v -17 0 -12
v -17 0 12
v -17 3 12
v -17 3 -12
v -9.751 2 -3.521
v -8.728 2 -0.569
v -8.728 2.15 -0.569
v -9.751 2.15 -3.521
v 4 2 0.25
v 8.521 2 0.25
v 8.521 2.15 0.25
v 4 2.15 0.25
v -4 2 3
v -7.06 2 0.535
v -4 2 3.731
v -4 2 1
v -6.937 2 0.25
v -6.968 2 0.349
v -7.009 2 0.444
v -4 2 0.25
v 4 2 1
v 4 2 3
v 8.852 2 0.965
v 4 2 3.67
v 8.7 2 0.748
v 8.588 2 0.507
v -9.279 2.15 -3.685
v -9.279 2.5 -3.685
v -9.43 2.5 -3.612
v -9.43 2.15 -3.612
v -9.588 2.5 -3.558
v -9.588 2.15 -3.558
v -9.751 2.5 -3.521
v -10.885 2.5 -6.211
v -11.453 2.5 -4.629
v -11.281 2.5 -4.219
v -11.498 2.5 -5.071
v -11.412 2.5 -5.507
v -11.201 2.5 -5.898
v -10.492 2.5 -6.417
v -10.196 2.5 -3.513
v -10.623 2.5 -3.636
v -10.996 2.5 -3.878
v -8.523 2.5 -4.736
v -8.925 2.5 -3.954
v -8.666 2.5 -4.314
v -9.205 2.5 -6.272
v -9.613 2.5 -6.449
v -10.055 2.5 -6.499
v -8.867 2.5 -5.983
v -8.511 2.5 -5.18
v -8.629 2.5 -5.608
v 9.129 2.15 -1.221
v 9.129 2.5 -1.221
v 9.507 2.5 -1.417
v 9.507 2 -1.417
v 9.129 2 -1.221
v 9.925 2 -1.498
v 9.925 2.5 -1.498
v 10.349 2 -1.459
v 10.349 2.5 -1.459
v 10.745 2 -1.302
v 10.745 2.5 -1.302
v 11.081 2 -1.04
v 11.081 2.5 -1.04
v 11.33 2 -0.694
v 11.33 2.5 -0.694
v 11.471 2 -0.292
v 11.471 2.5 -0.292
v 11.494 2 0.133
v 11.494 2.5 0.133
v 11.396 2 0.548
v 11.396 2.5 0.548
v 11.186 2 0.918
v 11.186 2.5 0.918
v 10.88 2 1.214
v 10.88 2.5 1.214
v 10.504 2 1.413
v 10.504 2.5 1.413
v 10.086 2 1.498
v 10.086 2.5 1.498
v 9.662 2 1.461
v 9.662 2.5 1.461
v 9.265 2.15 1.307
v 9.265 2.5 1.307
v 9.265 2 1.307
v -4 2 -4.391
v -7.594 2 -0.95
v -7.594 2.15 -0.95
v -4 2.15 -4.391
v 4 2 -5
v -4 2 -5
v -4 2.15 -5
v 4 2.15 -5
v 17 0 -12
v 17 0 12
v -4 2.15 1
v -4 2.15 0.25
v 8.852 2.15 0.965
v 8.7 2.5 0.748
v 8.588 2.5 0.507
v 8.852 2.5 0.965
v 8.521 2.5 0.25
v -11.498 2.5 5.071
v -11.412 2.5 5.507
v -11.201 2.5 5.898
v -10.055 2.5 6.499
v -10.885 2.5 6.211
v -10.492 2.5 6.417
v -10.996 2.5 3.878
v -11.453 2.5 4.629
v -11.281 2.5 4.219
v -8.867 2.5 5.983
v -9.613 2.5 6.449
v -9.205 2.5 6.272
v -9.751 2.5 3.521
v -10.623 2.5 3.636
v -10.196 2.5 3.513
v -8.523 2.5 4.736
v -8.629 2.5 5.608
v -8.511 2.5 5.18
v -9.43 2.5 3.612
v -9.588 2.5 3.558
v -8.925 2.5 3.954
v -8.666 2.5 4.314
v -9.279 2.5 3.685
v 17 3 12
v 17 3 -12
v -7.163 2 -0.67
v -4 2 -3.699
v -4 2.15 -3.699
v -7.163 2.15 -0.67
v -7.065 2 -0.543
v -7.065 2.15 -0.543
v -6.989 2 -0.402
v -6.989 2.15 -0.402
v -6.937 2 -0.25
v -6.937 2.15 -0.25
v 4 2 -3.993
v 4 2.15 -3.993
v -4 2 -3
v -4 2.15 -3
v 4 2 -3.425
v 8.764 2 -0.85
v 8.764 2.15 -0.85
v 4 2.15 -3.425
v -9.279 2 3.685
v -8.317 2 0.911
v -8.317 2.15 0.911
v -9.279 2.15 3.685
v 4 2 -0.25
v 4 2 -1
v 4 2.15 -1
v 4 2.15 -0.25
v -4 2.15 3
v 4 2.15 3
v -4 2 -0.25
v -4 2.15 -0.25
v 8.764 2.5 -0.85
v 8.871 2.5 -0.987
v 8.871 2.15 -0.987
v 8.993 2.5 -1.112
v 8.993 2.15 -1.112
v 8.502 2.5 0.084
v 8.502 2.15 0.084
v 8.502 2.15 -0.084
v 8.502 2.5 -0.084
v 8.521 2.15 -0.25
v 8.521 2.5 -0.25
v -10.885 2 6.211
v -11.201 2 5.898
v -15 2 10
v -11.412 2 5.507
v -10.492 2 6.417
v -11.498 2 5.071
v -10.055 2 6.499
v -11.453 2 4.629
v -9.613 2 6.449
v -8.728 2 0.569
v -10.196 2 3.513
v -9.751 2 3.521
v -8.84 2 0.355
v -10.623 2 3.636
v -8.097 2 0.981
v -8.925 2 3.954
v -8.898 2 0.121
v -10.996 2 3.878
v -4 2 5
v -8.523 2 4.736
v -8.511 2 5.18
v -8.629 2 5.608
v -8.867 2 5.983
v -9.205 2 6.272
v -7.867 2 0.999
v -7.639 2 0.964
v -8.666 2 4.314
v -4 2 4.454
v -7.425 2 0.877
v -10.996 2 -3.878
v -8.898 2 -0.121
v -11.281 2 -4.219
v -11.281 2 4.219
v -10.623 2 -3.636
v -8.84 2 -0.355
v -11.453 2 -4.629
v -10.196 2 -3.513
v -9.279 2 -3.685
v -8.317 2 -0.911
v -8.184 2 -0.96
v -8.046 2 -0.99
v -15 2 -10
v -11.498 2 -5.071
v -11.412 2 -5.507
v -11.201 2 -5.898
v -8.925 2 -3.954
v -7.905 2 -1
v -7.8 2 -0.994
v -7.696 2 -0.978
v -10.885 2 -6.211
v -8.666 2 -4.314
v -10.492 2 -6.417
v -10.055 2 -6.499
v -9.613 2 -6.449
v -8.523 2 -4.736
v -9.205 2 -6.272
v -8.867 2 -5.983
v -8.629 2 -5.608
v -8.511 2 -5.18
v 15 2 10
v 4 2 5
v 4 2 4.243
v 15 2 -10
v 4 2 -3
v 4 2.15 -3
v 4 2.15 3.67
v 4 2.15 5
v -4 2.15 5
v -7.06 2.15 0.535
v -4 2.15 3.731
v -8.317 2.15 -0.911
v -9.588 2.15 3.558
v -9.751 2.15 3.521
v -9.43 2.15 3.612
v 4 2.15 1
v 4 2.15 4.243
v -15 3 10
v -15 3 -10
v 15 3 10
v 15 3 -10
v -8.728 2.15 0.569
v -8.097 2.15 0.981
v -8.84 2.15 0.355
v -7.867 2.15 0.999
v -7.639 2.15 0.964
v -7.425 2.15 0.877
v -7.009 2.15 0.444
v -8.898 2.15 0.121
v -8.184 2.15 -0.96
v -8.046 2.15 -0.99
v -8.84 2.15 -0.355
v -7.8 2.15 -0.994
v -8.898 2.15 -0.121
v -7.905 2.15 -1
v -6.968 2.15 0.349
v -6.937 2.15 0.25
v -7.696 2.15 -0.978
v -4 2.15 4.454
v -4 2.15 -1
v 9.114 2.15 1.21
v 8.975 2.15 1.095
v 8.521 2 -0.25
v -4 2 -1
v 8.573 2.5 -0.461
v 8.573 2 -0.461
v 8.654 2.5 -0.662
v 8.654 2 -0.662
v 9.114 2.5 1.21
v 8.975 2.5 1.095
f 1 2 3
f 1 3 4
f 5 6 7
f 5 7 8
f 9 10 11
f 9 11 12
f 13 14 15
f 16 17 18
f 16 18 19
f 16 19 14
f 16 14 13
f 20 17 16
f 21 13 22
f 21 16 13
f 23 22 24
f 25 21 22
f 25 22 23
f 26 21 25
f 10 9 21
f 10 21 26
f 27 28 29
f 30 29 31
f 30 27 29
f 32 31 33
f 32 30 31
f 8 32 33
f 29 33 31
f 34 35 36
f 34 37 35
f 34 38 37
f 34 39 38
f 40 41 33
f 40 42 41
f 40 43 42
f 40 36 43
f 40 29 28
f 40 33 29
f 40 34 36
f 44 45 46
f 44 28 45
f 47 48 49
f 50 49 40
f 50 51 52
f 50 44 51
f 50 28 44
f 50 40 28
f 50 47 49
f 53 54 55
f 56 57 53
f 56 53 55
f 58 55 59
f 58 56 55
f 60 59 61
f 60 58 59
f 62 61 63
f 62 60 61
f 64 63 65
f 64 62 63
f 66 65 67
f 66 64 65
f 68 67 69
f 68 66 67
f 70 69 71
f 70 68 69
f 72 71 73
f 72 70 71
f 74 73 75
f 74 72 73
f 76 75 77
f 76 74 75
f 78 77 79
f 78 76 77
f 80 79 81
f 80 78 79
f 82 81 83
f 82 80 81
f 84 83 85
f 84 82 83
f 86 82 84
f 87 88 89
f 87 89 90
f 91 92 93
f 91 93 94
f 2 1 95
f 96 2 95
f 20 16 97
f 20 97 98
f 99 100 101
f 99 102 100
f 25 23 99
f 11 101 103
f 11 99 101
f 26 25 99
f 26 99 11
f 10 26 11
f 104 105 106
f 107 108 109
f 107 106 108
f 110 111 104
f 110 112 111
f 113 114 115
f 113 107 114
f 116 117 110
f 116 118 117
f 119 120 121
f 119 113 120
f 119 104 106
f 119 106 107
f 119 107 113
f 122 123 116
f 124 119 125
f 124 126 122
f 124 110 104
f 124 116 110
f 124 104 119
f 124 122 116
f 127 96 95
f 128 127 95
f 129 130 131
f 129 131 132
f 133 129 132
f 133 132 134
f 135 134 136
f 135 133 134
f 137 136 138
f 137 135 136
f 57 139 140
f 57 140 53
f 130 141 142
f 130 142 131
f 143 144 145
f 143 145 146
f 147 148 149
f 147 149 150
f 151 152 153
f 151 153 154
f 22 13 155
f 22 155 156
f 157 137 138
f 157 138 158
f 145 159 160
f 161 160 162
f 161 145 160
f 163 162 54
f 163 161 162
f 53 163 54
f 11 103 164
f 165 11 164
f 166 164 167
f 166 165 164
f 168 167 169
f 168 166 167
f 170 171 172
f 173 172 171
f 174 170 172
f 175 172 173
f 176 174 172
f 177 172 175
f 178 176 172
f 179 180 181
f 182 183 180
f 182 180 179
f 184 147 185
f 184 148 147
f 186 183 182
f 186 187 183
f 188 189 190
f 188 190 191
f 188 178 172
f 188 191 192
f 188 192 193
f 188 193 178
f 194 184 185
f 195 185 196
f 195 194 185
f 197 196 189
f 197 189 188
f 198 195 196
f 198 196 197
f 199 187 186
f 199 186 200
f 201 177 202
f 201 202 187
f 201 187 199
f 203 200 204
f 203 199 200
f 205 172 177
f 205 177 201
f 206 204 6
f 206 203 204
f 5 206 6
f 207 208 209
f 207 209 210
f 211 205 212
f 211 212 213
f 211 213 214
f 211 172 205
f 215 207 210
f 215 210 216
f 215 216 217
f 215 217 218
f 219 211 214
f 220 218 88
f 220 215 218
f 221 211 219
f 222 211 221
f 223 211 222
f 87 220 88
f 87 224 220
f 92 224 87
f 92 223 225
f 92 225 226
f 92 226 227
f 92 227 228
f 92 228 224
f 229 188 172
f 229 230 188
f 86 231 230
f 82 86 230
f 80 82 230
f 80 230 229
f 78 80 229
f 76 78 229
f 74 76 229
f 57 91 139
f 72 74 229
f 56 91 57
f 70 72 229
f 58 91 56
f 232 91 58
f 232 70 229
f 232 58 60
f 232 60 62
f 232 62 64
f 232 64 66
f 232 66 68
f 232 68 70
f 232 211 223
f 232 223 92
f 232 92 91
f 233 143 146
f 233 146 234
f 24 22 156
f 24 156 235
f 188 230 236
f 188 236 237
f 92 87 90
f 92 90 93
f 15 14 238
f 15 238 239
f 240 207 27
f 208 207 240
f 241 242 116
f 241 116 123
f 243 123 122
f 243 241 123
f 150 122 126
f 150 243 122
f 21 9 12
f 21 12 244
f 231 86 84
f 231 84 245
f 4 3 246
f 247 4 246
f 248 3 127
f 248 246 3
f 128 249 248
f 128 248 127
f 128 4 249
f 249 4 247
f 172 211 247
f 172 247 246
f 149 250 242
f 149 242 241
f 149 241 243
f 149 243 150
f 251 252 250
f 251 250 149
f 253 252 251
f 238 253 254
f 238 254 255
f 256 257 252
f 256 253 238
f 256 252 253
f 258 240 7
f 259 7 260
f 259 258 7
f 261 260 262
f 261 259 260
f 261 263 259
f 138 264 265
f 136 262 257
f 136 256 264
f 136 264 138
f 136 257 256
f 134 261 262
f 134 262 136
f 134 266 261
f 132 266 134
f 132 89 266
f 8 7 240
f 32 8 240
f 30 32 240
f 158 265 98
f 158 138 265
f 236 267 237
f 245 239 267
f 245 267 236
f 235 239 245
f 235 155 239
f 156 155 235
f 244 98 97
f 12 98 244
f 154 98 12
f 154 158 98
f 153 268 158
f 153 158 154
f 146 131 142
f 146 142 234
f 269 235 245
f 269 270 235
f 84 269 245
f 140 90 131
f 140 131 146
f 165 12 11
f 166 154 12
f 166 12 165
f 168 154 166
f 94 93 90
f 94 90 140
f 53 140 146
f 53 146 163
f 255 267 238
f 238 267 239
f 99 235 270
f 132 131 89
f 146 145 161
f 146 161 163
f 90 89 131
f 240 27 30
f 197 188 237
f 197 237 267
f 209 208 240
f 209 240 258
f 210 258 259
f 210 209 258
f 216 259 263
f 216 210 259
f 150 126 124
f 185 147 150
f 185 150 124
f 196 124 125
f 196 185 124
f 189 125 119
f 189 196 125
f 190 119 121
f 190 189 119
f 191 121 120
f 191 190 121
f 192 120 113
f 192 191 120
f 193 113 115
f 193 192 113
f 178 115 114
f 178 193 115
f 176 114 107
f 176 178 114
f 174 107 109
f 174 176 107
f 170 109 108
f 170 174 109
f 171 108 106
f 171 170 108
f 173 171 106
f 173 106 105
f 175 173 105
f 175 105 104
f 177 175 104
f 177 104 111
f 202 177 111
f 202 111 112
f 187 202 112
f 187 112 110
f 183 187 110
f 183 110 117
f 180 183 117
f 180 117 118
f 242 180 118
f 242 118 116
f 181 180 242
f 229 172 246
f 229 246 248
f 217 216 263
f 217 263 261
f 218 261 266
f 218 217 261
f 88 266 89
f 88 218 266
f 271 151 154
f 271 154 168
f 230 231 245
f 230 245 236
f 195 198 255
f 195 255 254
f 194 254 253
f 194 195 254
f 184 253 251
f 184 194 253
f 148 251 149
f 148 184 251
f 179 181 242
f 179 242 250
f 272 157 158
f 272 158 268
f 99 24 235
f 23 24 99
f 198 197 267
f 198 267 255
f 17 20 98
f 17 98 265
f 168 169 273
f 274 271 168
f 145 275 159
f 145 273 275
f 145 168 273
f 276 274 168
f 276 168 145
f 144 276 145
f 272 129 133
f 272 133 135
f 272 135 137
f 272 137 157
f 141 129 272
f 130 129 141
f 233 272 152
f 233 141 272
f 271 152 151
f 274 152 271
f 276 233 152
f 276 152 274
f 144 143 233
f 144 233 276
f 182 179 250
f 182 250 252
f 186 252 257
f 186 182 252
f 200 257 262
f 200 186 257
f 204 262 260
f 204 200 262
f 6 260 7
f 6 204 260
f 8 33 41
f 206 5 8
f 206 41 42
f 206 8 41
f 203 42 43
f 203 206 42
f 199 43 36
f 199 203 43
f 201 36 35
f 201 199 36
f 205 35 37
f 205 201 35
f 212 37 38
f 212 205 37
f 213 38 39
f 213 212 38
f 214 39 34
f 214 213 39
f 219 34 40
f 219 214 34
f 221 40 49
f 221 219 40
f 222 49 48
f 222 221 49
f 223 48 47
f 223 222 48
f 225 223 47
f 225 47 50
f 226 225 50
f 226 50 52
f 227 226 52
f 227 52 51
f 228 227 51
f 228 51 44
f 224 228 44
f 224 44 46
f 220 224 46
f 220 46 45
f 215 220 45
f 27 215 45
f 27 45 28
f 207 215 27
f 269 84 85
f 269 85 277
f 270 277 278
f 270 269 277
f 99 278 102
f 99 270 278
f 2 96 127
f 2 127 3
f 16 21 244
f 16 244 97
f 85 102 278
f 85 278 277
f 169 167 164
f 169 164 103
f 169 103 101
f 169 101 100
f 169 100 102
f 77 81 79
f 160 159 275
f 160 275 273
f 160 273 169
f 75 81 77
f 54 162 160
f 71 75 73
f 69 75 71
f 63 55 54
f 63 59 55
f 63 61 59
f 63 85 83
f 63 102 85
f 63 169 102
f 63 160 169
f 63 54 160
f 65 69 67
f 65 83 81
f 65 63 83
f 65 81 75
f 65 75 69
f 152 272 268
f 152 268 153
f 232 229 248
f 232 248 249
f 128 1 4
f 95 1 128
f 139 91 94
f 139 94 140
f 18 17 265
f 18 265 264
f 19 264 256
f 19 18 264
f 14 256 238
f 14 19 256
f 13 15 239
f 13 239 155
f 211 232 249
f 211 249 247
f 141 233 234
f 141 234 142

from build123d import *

# Parameters (mm, degrees)
CROQUIS1_W              = 34
CROQUIS1_H              = 24
SALIENTE_EXTRUIR1_DEPTH = 3
CAVIDAD1_START          = 2
CAVIDAD1_OUTLINE_W      = 30
CAVIDAD1_OUTLINE_H      = 20
CAVIDAD1_DEPTH          = 1
CAVIDAD1_START_2        = 2.15
CAVIDAD1_2_DEPTH        = 0.85
CAVIDAD1_START_3        = 2.5
CAVIDAD1_3_OUTLINE_R    = 1.5
CAVIDAD1_3_DEPTH        = 0.5
SALIENTE_EXTRUIR3_DEPTH = 0.5
CROQUIS6_W              = 7.77529117
CROQUIS6_H              = 2
CROQUIS6_W_2            = 2
CROQUIS6_H_2            = 19.575879517
CROQUIS6_W_3            = 7.699177506
CROQUIS6_H_3            = 2.365035227
CROQUIS6_W_4            = 2.895421418
CROQUIS6_W_5            = 7.822528086
CROQUIS6_H_4            = 2.895421418
CROQUIS6_W_6            = 2.695737182
CORTAR_EXTRUIR1_DEPTH   = 0.5


# Read off the part's stored shape, not the designer's step: Cavidad1
with BuildPart() as part:
    # Croquis1 → Saliente-Extruir1 (new body)
    with BuildSketch(Plane(origin=(0, 0, 0), x_dir=(1, 0, 0), z_dir=(0, 1, 0))):
        Rectangle(CROQUIS1_W, CROQUIS1_H)
    extrude(amount=SALIENTE_EXTRUIR1_DEPTH)

    # Cavidad1 outline → Cavidad1 (cut)
    # profile 1 of 3: a face of its own
    with BuildSketch(Plane(origin=(0, 0, 0), x_dir=(1, 0, 0), z_dir=(0, 1, 0)).offset(CAVIDAD1_START)):
        Rectangle(CAVIDAD1_OUTLINE_W, CAVIDAD1_OUTLINE_H)
        with BuildLine():
            Line((-9.751477048, -3.520731146), (-8.727521258, -0.568876422))
            ThreePointArc((-8.727521258, -0.568876422), (-8.905098242, 0), (-8.727521258, 0.568876422))
            Line((-8.727521258, 0.568876422), (-9.751477048, 3.520731146))
            ThreePointArc((-9.751477048, 3.520731146), (-10.491591745, 6.417158268), (-9.279090958, 3.684595061))
            Line((-9.279090958, 3.684595061), (-8.317043268, 0.911208701))
            ThreePointArc((-8.317043268, 0.911208701), (-8.115800994, 0.977550178), (-7.905098242, 1))
            ThreePointArc((-7.905098242, 1), (-7.74739704, 0.987486876), (-7.593642508, 0.950260662))
            Line((-7.593642508, 0.950260662), (-4, 4.391446273))
            Line((-4, 4.391446273), (-4, 5))
            Line((-4, 5), (4, 5))
            Line((4, 5), (4, 3.993093842))
            Line((4, 3.993093842), (9.128751089, 1.221034535))
            ThreePointArc((9.128751089, 1.221034535), (11.497837988, 0.08050691), (9.264650579, -1.307387176))
            Line((9.264650579, -1.307387176), (4, -4.242890617))
            Line((4, -4.242890617), (4, -5))
            Line((4, -5), (-4, -5))
            Line((-4, -5), (-4, -4.453815845))
            Line((-4, -4.453815845), (-7.424912859, -0.87716703))
            ThreePointArc((-7.424912859, -0.87716703), (-7.866968261, -0.999272788), (-8.317043268, -0.911208701))
            Line((-8.317043268, -0.911208701), (-9.279090958, -3.684595061))
            ThreePointArc((-9.279090958, -3.684595061), (-10.491591745, -6.417158268), (-9.751477048, -3.520731146))
        make_face(mode=Mode.SUBTRACT)
    # profile 2 of 3: a face of its own
    with BuildSketch(Plane(origin=(0, 0, 0), x_dir=(1, 0, 0), z_dir=(0, 1, 0)).offset(CAVIDAD1_START)):
        with BuildLine():
            ThreePointArc((8.520980054, 0.25), (8.609737932, 0.563179707), (8.763967569, 0.849837532))
            Line((8.763967569, 0.849837532), (4, 3.424733527))
            Line((4, 3.424733527), (4, 3))
            Line((4, 3), (-4, 3))
            Line((-4, 3), (-4, 3.699176151))
            Line((-4, 3.699176151), (-7.163035026, 0.670329906))
            ThreePointArc((-7.163035026, 0.670329906), (-7.024496987, 0.473858025), (-6.936852406, 0.25))
            Line((-6.936852406, 0.25), (-4, 0.25))
            Line((-4, 0.25), (-4, 1))
            Line((-4, 1), (4, 1))
            Line((4, 1), (4, 0.25))
            Line((4, 0.25), (8.520980054, 0.25))
        make_face()
    # profile 3 of 3: a face of its own
    with BuildSketch(Plane(origin=(0, 0, 0), x_dir=(1, 0, 0), z_dir=(0, 1, 0)).offset(CAVIDAD1_START)):
        with BuildLine():
            Line((4, -3.670417072), (8.851743131, -0.96514567))
            ThreePointArc((8.851743131, -0.96514567), (8.63856539, -0.629679127), (8.520980054, -0.25))
            Line((8.520980054, -0.25), (4, -0.25))
            Line((4, -0.25), (4, -1))
            Line((4, -1), (-4, -1))
            Line((-4, -1), (-4, -0.25))
            Line((-4, -0.25), (-6.936852406, -0.25))
            ThreePointArc((-6.936852406, -0.25), (-6.987424899, -0.397335669), (-7.060265081, -0.535029839))
            Line((-7.060265081, -0.535029839), (-4, -3.730875667))
            Line((-4, -3.730875667), (-4, -3))
            Line((-4, -3), (4, -3))
            Line((4, -3), (4, -3.670417072))
        make_face()
    extrude(amount=CAVIDAD1_DEPTH, mode=Mode.SUBTRACT)

    # Cavidad1 2 outline → Cavidad1 2 (cut)
    with BuildSketch(Plane(origin=(0, 0, 0), x_dir=(1, 0, 0), z_dir=(0, 1, 0)).offset(CAVIDAD1_START_2)):
        with BuildLine():
            ThreePointArc((-8.727521258, 0.568876422), (-8.905098242, 0), (-8.727521258, -0.568876422))
            Line((-8.727521258, -0.568876422), (-9.751477048, -3.520731146))
            ThreePointArc((-9.751477048, -3.520731146), (-9.508408255, -3.582841732), (-9.279090958, -3.684595061))
            Line((-9.279090958, -3.684595061), (-8.317043268, -0.911208701))
            ThreePointArc((-8.317043268, -0.911208701), (-7.866968261, -0.999272788), (-7.424912859, -0.87716703))
            Line((-7.424912859, -0.87716703), (-4, -4.453815845))
            Line((-4, -4.453815845), (-4, -5))
            Line((-4, -5), (4, -5))
            Line((4, -5), (4, -4.242890617))
            Line((4, -4.242890617), (9.264650579, -1.307387176))
            ThreePointArc((9.264650579, -1.307387176), (9.042777207, -1.154869917), (8.851743131, -0.96514567))
            Line((8.851743131, -0.96514567), (4, -3.670417072))
            Line((4, -3.670417072), (4, -3))
            Line((4, -3), (-4, -3))
            Line((-4, -3), (-4, -3.730875667))
            Line((-4, -3.730875667), (-7.060265081, -0.535029839))
            ThreePointArc((-7.060265081, -0.535029839), (-6.987424899, -0.397335669), (-6.936852406, -0.25))
            Line((-6.936852406, -0.25), (-4, -0.25))
            Line((-4, -0.25), (-4, -1))
            Line((-4, -1), (4, -1))
            Line((4, -1), (4, -0.25))
            Line((4, -0.25), (8.520980054, -0.25))
            ThreePointArc((8.520980054, -0.25), (8.5, 0), (8.520980054, 0.25))
            Line((8.520980054, 0.25), (4, 0.25))
            Line((4, 0.25), (4, 1))
            Line((4, 1), (-4, 1))
            Line((-4, 1), (-4, 0.25))
            Line((-4, 0.25), (-6.936852406, 0.25))
            ThreePointArc((-6.936852406, 0.25), (-7.024496987, 0.473858025), (-7.163035026, 0.670329906))
            Line((-7.163035026, 0.670329906), (-4, 3.699176151))
            Line((-4, 3.699176151), (-4, 3))
            Line((-4, 3), (4, 3))
            Line((4, 3), (4, 3.424733527))
            Line((4, 3.424733527), (8.763967569, 0.849837532))
            ThreePointArc((8.763967569, 0.849837532), (8.930137641, 1.051377446), (9.128751089, 1.221034535))
            Line((9.128751089, 1.221034535), (4, 3.993093842))
            Line((4, 3.993093842), (4, 5))
            Line((4, 5), (-4, 5))
            Line((-4, 5), (-4, 4.391446273))
            Line((-4, 4.391446273), (-7.593642508, 0.950260662))
            ThreePointArc((-7.593642508, 0.950260662), (-7.74739704, 0.987486876), (-7.905098242, 1))
            ThreePointArc((-7.905098242, 1), (-8.115800994, 0.977550178), (-8.317043268, 0.911208701))
            Line((-8.317043268, 0.911208701), (-9.279090958, 3.684595061))
            ThreePointArc((-9.279090958, 3.684595061), (-9.508408255, 3.582841732), (-9.751477048, 3.520731146))
            Line((-9.751477048, 3.520731146), (-8.727521258, 0.568876422))
        make_face()
    extrude(amount=CAVIDAD1_2_DEPTH, mode=Mode.SUBTRACT)

    # Cavidad1 3 outline → Cavidad1 3 (cut)
    with BuildSketch(Plane(origin=(0, 0, 0), x_dir=(1, 0, 0), z_dir=(0, 1, 0)).offset(CAVIDAD1_START_3)):
        with Locations((-10, -5)):
            Circle(CAVIDAD1_3_OUTLINE_R)
        with Locations((-10, 5)):
            Circle(CAVIDAD1_3_OUTLINE_R)
        with Locations((10, 0)):
            Circle(CAVIDAD1_3_OUTLINE_R)
    extrude(amount=CAVIDAD1_3_DEPTH, mode=Mode.SUBTRACT)

    # Croquis5 → Saliente-Extruir3 (add)
    with BuildSketch(Plane(origin=(0, 3, 0), x_dir=(1, 0, 0), z_dir=(0, 1, 0))):
        Polygon((-17, 12), (-7, 12), (-7, 10), (-15, 10), (-15, -10), (-7, -10), (-7, -12), (-17, -12), align=None)
        Polygon((7, 12), (17, 12), (17, -12), (7, -12), (7, -10), (15, -10), (15, 10), (7, 10), align=None)
    extrude(amount=SALIENTE_EXTRUIR3_DEPTH)

    # Croquis6 → Cortar-Extruir1 (cut)
    with BuildSketch(Plane(origin=(0, 3.5, 0), x_dir=(1, 0, 0), z_dir=(0, 1, 0))):
        with Locations((-10.887645585, -11)):
            Rectangle(CROQUIS6_W, CROQUIS6_H)
        with Locations((-16, -0.159576746)):
            Rectangle(CROQUIS6_W_2, CROQUIS6_H_2)
        with Locations((-10.887645585, 11)):
            Rectangle(CROQUIS6_W, CROQUIS6_H)
        Polygon((-17, 12), (-17, 9.628363012), (-15, 9.628363012), (-15, 10), (-14.77529117, 10), (-14.77529117, 12), align=None)
        Polygon((-15, -9.947516505), (-17, -9.947516505), (-17, -12), (-14.77529117, -12), (-14.77529117, -10), (-15, -10), align=None)
        with Locations((10.830941942, -11.045685777)):
            Rectangle(CROQUIS6_W_3, CROQUIS6_H_3)
        with Locations((16.128241404, -11.045685777)):
            Rectangle(CROQUIS6_W_4, CROQUIS6_H_3)
        Polygon((17.575952113, -12.22820339), (14.680530695, -12.22820339), (14.680530695, -12.891712404), (17.84219776, -12.891712404), (17.84219776, 13.499887418), (14.680530695, 13.499887418), (14.680530695, 12.667869769), (17.376267877, 12.667869769), (17.376267877, 9.772448351), (14.680530695, 9.772448351), (14.680530695, -9.863168163), (17.575952113, -9.863168163), align=None)
        with Locations((10.769266652, 11.22015906)):
            Rectangle(CROQUIS6_W_5, CROQUIS6_H_4)
        with Locations((16.028399286, 11.22015906)):
            Rectangle(CROQUIS6_W_6, CROQUIS6_H_4)
    extrude(amount=-CORTAR_EXTRUIR1_DEPTH, mode=Mode.SUBTRACT)


solid = part.part
